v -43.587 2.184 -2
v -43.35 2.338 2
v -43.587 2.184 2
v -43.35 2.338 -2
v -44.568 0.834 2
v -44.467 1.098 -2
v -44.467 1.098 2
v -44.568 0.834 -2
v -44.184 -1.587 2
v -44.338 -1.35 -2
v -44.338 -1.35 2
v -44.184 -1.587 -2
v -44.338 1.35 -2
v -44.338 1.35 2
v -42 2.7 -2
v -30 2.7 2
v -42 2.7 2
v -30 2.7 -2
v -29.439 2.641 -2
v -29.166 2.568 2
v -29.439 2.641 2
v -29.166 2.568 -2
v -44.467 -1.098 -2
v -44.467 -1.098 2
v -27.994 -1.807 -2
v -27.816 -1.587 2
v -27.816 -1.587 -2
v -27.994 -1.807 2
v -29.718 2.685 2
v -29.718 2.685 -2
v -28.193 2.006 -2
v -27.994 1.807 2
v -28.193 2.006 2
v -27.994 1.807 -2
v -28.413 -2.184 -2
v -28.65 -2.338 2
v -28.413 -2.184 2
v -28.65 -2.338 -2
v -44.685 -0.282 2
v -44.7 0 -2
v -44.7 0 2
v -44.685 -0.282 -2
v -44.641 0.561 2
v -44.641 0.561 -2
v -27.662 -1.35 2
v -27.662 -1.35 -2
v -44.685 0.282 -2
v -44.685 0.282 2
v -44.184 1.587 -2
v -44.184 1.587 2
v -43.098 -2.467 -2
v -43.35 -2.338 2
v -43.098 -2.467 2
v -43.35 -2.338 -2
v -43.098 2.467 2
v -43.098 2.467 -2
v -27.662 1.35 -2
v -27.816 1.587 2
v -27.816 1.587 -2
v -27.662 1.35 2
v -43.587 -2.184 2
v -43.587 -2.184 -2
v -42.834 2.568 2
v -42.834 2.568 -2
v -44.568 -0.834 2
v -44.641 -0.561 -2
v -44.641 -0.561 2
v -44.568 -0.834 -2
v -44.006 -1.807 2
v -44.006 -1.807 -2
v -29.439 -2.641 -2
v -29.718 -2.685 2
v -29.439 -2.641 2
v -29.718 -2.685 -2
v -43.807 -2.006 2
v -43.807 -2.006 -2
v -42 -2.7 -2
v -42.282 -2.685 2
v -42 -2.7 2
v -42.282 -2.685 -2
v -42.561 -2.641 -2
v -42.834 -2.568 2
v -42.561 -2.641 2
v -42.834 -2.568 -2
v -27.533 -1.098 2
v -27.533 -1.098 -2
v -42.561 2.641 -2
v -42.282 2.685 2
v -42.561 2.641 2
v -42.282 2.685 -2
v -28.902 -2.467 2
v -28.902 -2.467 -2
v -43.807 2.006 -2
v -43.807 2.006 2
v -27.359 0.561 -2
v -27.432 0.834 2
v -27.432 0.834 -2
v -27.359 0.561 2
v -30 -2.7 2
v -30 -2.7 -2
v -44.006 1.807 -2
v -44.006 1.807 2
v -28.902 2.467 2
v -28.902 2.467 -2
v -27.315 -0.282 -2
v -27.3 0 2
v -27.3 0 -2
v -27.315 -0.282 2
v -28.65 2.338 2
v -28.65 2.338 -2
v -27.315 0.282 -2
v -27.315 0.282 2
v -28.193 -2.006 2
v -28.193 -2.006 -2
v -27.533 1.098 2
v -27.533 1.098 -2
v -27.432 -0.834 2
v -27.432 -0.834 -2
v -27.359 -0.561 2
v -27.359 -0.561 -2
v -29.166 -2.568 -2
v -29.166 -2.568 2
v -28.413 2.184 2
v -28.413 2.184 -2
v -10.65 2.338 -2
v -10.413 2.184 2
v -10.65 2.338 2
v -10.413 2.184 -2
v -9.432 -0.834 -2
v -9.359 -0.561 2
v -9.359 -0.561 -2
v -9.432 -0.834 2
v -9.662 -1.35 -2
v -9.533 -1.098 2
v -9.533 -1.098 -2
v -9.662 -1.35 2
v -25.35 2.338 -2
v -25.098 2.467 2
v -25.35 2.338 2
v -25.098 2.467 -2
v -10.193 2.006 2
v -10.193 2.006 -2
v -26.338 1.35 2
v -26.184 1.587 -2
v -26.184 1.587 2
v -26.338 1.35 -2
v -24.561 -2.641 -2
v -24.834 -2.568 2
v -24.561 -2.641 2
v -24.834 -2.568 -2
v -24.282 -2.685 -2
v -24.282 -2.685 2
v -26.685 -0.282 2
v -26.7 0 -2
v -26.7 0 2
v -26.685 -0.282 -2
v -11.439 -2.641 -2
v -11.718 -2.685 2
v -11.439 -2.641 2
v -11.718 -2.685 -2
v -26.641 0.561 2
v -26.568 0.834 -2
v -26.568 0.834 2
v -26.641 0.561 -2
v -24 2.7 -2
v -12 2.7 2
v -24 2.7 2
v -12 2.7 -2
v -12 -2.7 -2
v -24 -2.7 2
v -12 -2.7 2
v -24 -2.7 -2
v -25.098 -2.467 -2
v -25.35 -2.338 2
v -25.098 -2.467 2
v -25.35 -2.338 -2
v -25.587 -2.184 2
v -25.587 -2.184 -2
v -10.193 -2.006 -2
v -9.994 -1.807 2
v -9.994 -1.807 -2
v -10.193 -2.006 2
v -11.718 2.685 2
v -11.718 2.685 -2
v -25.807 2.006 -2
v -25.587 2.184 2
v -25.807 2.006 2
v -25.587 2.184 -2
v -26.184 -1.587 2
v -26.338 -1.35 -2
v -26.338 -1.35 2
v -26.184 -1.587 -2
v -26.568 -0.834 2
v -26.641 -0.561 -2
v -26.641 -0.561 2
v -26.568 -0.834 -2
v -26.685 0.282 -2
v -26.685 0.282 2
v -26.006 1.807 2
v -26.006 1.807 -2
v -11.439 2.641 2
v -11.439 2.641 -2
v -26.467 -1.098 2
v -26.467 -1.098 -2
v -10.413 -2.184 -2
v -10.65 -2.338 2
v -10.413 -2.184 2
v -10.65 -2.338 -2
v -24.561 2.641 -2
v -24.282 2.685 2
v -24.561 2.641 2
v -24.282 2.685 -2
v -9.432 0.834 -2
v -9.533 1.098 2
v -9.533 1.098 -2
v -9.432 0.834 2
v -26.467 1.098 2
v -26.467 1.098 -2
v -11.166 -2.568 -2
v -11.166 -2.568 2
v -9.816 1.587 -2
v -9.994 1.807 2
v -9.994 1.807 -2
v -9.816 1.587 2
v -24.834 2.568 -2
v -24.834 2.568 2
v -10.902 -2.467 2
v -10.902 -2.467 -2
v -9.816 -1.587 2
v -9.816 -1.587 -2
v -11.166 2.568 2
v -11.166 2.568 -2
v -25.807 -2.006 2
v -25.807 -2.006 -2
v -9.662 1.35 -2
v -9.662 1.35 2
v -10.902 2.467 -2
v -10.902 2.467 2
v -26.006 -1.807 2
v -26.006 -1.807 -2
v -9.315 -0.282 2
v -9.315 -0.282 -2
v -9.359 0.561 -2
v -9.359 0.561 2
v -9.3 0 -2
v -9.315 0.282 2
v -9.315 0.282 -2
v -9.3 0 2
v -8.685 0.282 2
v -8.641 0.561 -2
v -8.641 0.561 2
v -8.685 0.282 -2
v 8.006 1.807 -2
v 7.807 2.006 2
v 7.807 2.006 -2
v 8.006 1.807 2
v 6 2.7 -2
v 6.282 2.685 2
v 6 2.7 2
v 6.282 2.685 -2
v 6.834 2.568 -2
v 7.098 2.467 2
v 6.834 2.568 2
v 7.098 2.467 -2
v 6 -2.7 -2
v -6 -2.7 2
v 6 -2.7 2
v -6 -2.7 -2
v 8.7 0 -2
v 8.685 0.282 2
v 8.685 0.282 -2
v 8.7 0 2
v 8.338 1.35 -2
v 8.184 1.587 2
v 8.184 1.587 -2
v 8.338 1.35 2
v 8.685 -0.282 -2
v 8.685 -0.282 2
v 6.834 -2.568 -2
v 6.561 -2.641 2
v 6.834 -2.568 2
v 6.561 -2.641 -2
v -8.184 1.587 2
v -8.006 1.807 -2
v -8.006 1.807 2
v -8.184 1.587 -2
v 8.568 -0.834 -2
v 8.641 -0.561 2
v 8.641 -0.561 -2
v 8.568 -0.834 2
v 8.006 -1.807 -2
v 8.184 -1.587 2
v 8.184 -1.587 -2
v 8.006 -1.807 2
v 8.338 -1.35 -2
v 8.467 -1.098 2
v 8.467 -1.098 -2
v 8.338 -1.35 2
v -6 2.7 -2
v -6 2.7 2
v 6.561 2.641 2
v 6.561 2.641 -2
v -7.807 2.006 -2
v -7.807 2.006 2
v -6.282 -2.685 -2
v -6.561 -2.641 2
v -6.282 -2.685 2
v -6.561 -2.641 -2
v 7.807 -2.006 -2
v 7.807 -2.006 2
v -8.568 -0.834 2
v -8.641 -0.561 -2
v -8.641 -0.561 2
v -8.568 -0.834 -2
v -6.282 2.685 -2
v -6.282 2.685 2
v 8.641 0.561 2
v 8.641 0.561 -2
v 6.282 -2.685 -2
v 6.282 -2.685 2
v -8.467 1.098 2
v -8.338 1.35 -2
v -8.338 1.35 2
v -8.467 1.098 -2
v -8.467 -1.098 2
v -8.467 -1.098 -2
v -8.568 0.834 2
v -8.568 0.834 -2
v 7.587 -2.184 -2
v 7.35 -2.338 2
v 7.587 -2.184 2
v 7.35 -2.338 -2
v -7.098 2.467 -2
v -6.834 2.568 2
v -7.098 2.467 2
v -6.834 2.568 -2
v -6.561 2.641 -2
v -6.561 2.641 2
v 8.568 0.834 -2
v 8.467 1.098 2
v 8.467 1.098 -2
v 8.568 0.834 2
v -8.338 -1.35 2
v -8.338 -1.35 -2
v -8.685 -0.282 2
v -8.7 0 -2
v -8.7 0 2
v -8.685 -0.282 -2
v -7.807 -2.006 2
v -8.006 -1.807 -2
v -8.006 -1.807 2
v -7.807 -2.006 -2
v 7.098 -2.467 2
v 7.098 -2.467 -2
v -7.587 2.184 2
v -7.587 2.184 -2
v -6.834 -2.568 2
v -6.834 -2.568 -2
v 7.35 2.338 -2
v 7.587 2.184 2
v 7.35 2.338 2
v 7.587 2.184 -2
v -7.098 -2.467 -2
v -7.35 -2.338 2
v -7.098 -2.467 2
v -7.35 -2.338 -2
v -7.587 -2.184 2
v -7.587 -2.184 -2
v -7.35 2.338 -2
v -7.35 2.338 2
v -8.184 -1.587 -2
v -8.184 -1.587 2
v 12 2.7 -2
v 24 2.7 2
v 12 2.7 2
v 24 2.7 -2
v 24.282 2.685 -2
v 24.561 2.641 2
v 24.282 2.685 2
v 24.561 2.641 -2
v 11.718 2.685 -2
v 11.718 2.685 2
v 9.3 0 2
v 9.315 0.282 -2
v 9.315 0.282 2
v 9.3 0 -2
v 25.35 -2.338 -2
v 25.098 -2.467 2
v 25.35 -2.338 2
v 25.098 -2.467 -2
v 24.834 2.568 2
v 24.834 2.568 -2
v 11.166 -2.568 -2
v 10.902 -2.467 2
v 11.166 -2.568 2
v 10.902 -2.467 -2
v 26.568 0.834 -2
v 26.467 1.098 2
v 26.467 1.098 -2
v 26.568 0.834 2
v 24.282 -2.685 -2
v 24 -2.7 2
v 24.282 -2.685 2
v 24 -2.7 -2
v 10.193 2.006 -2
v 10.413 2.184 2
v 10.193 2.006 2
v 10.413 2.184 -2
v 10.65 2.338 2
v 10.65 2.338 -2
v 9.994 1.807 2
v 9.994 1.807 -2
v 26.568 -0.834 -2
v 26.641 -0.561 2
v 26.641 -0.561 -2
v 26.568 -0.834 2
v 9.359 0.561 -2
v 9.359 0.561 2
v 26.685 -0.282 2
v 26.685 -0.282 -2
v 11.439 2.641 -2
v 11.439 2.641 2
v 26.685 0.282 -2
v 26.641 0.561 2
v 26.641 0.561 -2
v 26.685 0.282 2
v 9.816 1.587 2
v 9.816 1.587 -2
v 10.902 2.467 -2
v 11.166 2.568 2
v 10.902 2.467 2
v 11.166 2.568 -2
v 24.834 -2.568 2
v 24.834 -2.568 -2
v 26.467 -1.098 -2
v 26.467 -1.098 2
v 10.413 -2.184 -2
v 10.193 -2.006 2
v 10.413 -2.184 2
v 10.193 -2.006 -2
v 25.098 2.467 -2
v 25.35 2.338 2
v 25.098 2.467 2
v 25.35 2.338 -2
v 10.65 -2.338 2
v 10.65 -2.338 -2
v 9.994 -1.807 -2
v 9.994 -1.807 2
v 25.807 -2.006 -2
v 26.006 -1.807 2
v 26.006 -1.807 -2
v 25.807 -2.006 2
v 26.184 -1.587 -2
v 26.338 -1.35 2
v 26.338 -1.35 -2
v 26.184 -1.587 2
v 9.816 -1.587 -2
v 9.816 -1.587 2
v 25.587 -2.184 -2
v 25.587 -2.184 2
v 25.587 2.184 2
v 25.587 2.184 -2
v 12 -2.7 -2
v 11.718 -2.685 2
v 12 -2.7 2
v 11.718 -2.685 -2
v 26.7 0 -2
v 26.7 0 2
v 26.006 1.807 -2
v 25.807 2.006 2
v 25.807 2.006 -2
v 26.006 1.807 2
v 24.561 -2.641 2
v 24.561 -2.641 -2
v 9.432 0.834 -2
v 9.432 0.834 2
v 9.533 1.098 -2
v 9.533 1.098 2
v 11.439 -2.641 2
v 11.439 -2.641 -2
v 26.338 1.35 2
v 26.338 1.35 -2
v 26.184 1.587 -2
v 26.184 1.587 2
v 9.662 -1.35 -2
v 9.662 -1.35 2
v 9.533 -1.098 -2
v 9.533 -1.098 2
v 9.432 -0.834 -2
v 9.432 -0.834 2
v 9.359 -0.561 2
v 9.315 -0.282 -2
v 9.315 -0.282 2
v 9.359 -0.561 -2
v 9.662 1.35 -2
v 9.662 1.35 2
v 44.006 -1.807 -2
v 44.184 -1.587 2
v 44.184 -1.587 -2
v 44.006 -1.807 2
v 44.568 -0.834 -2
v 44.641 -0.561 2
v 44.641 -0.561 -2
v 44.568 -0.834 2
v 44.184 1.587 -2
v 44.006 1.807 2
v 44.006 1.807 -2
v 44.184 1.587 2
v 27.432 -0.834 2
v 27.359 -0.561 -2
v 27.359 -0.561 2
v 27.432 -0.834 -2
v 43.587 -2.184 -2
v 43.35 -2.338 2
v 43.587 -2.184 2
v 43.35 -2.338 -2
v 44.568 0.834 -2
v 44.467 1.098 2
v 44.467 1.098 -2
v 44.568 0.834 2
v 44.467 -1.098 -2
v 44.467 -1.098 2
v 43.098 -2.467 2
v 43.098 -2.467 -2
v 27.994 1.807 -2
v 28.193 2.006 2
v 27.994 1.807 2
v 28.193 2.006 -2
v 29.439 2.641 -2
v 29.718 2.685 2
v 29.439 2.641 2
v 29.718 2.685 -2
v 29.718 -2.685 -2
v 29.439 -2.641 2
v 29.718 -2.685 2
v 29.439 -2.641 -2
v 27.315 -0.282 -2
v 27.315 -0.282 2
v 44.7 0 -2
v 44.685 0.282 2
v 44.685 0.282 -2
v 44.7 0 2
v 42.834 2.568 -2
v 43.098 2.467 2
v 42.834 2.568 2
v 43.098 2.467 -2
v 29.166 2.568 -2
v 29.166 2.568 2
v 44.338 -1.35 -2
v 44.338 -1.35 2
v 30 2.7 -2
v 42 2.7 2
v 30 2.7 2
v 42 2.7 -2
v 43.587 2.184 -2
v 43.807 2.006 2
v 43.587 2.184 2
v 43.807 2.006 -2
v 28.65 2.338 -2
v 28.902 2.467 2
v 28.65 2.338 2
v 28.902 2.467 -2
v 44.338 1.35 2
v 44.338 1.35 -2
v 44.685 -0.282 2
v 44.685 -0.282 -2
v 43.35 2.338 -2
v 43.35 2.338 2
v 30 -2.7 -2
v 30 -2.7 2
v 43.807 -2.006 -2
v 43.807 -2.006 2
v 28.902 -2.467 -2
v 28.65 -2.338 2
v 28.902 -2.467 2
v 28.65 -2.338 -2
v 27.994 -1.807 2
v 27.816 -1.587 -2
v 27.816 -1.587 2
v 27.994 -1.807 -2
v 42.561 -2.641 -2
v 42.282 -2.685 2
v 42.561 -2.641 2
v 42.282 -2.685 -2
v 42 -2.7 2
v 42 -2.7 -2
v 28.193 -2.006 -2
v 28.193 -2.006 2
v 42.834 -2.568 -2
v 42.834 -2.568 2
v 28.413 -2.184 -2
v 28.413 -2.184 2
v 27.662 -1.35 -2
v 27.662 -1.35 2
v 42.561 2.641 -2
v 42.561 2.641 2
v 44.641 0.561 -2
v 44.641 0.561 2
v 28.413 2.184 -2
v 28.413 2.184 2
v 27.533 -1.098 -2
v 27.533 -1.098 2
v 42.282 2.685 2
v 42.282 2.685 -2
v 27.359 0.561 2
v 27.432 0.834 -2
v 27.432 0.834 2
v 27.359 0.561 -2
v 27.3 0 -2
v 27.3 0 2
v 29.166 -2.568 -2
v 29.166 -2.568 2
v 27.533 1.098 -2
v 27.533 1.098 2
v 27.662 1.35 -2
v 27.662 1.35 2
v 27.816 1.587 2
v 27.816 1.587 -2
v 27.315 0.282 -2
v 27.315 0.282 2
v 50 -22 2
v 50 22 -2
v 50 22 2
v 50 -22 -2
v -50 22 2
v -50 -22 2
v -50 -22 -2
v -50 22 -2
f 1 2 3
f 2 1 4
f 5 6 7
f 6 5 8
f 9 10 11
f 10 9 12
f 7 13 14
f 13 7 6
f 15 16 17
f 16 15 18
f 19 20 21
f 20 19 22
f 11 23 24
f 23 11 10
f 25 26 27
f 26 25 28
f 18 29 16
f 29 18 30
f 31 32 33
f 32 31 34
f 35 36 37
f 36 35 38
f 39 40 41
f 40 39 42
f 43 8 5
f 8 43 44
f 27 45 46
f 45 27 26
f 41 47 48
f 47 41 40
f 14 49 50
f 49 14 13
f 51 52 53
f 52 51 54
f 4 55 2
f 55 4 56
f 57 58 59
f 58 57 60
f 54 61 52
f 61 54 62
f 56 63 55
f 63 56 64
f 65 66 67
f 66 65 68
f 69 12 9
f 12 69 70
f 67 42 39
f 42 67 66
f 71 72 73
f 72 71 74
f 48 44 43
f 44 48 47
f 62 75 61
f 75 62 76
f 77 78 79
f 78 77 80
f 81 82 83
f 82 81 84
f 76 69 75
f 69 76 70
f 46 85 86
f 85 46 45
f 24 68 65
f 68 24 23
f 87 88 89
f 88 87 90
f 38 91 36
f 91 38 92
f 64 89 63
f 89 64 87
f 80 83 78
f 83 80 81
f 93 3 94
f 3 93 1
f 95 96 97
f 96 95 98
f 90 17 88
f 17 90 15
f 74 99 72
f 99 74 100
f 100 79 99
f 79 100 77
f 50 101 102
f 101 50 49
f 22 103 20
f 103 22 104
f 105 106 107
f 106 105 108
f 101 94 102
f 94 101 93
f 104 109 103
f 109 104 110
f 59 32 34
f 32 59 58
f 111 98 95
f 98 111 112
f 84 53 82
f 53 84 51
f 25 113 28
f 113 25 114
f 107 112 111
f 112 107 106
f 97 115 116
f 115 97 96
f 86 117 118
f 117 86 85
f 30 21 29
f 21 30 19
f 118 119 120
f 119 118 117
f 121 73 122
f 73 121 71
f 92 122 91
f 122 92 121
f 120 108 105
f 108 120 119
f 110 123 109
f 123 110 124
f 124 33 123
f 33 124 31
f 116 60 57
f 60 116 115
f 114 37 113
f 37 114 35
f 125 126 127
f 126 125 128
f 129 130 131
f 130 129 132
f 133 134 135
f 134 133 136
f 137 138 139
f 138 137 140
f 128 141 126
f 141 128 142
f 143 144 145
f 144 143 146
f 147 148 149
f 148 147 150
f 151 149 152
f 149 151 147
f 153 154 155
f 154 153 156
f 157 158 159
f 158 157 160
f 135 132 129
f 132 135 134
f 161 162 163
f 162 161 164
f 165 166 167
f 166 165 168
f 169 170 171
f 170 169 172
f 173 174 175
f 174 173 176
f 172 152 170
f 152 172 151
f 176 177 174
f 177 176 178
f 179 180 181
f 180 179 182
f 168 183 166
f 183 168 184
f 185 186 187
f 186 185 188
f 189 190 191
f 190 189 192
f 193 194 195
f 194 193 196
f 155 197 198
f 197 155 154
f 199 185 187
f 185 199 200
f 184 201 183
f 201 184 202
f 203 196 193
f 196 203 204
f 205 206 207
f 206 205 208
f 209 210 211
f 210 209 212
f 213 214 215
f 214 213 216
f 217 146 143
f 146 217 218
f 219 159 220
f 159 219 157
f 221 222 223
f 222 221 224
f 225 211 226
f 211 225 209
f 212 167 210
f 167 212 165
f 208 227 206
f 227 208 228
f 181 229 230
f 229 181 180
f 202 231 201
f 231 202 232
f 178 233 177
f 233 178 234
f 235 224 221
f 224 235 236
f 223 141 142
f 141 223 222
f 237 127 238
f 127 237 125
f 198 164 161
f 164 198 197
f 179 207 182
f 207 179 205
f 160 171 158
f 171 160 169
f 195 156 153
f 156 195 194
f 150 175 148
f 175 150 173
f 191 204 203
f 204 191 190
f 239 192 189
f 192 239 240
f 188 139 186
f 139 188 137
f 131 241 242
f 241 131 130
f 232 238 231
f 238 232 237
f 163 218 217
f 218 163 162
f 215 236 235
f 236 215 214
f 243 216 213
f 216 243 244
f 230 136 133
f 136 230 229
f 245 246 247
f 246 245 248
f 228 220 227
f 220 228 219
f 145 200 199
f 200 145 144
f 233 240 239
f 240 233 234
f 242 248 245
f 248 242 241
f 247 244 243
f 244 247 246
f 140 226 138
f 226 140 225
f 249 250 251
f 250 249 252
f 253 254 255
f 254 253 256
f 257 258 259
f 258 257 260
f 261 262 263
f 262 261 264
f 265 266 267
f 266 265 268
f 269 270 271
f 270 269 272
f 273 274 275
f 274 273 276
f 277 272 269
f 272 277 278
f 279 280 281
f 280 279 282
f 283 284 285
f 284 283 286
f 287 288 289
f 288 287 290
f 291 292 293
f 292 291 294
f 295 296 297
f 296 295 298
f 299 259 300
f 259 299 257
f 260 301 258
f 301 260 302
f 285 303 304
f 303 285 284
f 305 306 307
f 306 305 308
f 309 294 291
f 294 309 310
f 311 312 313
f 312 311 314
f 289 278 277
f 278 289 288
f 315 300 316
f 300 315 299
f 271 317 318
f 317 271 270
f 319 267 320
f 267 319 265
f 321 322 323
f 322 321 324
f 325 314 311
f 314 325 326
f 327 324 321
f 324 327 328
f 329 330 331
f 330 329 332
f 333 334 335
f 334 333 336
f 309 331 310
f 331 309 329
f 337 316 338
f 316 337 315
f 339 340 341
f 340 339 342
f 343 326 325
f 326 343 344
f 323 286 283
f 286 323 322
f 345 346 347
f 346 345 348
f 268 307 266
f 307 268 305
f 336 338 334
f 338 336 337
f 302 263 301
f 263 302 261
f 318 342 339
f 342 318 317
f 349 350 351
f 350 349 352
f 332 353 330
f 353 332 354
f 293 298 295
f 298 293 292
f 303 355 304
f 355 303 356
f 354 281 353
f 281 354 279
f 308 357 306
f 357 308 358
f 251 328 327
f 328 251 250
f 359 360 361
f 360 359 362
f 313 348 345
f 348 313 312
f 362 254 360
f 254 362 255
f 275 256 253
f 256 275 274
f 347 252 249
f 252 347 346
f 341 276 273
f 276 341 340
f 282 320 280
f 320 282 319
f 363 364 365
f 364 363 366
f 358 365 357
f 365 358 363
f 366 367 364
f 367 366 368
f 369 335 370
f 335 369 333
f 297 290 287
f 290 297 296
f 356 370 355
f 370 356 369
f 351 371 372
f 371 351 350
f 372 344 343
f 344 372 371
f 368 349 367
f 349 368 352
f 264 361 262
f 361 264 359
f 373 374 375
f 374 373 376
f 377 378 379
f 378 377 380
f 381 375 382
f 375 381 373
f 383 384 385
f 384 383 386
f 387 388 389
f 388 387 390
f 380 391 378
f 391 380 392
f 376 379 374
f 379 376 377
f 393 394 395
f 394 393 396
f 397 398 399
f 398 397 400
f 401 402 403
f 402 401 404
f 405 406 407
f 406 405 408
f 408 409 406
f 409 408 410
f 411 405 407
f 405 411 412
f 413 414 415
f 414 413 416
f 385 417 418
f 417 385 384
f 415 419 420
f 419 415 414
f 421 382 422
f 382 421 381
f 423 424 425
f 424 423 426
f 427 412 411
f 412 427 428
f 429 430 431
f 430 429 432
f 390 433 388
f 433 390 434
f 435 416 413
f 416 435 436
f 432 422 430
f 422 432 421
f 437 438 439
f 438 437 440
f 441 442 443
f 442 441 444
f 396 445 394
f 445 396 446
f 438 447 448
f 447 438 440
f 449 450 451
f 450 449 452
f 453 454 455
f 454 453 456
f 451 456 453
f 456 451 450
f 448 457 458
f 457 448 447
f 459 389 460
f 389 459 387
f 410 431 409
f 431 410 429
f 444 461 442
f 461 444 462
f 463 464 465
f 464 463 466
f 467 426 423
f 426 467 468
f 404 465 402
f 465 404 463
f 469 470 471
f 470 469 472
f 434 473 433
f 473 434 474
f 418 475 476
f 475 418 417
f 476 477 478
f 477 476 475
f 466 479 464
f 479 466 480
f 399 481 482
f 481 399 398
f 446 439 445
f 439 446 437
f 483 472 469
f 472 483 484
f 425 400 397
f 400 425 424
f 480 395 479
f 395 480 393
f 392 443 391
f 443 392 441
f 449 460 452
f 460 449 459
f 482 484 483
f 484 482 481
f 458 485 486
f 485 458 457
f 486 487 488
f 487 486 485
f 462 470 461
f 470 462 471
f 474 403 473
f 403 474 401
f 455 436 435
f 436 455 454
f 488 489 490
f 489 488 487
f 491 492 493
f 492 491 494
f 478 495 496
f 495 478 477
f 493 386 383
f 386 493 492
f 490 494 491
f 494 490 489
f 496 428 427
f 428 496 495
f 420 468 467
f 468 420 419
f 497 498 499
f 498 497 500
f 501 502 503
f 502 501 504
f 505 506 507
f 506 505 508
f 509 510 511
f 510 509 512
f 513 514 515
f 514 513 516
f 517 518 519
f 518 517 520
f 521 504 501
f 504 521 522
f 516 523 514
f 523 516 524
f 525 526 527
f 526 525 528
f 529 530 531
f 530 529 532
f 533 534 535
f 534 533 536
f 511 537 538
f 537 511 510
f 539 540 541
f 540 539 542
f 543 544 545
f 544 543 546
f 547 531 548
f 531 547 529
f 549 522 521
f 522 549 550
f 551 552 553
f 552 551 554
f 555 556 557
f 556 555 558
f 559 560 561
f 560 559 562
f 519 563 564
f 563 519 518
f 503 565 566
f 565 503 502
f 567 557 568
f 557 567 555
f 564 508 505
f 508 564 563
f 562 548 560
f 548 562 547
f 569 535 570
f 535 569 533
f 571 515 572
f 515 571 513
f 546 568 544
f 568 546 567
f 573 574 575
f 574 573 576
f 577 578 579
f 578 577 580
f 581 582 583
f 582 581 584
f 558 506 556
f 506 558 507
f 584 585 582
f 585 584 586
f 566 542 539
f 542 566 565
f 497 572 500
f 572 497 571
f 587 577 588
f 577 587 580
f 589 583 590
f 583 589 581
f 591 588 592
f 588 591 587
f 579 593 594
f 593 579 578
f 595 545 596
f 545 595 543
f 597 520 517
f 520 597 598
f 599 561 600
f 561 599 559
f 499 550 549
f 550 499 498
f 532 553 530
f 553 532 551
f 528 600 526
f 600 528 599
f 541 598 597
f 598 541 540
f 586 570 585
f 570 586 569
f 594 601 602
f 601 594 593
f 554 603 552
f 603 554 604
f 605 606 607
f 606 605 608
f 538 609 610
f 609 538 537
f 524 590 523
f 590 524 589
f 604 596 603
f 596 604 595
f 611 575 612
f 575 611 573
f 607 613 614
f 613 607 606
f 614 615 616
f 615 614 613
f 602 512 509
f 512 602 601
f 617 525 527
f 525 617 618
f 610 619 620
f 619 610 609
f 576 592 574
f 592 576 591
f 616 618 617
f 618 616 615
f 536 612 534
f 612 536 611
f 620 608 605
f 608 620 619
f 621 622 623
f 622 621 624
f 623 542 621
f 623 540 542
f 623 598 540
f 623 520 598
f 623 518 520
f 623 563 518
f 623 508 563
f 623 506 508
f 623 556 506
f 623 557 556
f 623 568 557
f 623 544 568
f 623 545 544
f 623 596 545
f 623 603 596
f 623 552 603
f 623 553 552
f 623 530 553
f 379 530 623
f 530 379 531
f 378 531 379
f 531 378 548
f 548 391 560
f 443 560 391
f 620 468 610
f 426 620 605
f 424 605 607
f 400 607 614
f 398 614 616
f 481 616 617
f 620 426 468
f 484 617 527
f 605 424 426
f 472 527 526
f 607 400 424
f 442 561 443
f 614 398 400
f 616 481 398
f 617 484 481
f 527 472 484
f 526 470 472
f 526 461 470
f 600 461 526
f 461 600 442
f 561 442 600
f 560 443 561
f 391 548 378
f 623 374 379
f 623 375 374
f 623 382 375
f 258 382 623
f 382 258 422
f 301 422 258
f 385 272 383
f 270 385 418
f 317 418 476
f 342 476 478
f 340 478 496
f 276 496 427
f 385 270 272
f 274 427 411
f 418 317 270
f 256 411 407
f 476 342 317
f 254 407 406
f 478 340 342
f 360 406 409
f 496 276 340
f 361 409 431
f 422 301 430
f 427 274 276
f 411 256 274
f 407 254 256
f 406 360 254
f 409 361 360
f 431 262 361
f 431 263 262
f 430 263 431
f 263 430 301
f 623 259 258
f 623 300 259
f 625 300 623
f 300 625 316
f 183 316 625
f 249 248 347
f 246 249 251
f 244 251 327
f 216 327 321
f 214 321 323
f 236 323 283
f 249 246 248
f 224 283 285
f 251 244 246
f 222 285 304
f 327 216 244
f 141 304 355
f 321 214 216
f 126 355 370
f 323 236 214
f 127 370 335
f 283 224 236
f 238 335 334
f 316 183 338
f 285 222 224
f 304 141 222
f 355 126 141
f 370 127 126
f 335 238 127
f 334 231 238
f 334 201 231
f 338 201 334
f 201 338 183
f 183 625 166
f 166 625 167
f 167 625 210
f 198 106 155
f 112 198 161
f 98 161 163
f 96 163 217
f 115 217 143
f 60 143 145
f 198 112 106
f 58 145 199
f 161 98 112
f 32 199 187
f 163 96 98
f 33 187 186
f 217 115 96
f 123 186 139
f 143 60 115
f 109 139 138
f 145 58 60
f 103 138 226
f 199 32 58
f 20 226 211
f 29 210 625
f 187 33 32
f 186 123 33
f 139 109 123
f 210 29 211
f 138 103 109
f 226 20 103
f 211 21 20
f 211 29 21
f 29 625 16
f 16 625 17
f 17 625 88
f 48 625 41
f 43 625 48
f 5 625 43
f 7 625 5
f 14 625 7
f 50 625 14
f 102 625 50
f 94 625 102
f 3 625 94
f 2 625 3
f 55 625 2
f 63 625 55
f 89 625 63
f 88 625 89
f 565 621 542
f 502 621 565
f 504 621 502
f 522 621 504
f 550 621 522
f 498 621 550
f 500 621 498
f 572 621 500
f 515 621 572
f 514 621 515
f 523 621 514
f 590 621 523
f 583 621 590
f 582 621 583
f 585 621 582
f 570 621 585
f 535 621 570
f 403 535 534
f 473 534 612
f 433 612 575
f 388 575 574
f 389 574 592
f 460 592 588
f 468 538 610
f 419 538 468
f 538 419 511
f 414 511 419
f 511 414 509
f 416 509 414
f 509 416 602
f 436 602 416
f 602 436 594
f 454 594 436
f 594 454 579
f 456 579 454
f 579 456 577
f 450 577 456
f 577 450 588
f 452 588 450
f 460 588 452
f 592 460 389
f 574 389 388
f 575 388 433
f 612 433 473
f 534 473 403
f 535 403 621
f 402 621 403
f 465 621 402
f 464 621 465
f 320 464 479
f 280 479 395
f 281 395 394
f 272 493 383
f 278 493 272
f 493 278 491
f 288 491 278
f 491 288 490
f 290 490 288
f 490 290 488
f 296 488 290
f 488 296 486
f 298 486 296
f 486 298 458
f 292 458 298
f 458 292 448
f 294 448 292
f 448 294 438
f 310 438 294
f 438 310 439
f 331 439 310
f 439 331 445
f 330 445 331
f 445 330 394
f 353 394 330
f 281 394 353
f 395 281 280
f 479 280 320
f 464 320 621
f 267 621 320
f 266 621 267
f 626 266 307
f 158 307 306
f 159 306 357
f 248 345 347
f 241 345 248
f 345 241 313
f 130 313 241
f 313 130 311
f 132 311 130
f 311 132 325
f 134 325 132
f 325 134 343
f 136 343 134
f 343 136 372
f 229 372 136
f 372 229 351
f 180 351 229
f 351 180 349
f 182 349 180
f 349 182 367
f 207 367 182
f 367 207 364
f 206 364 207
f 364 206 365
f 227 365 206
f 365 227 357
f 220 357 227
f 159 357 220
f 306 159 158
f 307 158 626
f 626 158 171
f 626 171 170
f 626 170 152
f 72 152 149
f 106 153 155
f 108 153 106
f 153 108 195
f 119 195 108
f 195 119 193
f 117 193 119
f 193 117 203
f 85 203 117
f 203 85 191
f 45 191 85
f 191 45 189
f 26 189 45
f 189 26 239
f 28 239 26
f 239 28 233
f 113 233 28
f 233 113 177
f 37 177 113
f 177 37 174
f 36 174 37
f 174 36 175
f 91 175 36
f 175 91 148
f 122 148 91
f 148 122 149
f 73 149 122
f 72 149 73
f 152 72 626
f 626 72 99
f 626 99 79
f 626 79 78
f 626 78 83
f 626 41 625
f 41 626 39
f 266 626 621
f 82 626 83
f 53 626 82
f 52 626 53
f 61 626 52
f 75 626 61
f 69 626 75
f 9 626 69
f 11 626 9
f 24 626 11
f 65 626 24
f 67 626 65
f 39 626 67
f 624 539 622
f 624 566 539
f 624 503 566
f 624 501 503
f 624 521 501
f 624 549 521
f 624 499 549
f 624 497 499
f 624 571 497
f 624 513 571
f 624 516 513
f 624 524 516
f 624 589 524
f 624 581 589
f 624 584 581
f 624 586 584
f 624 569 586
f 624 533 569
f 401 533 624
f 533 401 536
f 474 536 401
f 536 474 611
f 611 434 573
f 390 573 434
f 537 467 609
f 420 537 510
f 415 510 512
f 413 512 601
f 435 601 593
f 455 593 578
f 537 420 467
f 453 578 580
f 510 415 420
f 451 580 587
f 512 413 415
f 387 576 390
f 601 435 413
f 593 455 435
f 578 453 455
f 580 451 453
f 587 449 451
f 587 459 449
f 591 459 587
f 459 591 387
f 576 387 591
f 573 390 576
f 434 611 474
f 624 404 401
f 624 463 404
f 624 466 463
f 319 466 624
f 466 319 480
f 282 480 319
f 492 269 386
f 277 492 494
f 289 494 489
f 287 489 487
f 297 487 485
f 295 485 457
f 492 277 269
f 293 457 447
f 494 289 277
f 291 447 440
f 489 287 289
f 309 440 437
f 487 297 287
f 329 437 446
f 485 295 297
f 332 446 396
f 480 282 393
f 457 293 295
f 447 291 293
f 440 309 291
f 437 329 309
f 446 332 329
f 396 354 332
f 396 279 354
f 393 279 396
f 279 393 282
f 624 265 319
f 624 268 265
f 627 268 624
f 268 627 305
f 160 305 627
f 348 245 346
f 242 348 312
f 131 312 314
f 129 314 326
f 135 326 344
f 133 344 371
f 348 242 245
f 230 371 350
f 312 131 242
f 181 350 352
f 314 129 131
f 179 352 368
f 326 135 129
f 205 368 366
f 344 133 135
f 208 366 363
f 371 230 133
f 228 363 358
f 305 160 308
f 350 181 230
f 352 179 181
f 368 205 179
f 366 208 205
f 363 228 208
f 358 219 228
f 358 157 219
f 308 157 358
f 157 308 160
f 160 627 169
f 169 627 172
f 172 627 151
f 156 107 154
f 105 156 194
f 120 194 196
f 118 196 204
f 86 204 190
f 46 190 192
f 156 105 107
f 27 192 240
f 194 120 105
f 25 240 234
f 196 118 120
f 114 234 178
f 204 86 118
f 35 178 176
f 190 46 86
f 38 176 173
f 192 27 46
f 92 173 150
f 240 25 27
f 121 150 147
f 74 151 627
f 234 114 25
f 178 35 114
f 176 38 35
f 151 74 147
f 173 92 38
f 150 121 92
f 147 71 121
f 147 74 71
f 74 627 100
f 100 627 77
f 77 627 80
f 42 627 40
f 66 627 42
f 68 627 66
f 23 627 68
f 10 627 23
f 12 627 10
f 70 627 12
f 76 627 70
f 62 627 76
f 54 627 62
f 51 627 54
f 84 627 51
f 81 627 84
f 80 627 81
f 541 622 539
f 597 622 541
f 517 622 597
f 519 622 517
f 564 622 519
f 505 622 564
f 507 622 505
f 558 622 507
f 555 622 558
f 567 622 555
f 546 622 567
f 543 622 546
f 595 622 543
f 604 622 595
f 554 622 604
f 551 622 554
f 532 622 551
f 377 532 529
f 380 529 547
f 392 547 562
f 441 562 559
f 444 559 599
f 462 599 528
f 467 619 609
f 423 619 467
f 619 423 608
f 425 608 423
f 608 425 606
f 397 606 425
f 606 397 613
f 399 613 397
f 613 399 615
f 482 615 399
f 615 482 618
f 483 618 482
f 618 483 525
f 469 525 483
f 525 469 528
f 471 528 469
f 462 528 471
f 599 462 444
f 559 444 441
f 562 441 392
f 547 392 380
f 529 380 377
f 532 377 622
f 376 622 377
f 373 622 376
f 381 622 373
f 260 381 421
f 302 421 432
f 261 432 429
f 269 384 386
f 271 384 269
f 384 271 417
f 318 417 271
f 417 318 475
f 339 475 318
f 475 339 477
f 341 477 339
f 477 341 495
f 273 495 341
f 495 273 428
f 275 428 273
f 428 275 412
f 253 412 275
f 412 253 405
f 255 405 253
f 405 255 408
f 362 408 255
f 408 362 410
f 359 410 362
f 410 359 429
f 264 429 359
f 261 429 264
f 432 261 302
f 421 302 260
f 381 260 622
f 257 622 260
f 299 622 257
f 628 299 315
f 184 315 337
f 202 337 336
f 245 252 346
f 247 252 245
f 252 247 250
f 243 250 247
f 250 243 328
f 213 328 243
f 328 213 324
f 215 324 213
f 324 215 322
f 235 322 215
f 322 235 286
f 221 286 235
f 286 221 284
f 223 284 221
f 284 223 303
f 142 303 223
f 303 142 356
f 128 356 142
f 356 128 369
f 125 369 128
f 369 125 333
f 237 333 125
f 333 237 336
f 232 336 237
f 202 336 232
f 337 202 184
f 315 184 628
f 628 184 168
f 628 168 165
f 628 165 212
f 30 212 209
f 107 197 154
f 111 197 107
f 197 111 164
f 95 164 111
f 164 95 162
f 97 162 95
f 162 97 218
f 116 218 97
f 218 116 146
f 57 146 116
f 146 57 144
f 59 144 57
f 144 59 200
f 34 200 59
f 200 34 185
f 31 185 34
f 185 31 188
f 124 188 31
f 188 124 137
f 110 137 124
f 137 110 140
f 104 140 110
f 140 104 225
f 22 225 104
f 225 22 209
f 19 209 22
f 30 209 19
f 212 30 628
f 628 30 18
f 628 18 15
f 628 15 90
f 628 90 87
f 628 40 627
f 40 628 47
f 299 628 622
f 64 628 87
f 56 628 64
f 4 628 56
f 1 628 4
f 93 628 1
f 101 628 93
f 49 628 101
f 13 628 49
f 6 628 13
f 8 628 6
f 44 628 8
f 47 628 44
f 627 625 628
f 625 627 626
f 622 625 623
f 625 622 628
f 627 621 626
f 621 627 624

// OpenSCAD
// Slotted mounting plate.
$fn = 60;
eps = 0.02;
plate_l = 100;
plate_w = 44;
plate_t = 4;
slot_l = 12;
module slot(x) { hull() { translate([x-slot_l/2,0,-plate_t/2-eps]) cylinder(d=5.4,h=plate_t+2*eps); translate([x+slot_l/2,0,-plate_t/2-eps]) cylinder(d=5.4,h=plate_t+2*eps); } }
difference() { cube([plate_l,plate_w,plate_t],center=true); for(i=[0:4]) slot(-plate_l/2+14+i*(plate_l-28)/max(1,4)); }
